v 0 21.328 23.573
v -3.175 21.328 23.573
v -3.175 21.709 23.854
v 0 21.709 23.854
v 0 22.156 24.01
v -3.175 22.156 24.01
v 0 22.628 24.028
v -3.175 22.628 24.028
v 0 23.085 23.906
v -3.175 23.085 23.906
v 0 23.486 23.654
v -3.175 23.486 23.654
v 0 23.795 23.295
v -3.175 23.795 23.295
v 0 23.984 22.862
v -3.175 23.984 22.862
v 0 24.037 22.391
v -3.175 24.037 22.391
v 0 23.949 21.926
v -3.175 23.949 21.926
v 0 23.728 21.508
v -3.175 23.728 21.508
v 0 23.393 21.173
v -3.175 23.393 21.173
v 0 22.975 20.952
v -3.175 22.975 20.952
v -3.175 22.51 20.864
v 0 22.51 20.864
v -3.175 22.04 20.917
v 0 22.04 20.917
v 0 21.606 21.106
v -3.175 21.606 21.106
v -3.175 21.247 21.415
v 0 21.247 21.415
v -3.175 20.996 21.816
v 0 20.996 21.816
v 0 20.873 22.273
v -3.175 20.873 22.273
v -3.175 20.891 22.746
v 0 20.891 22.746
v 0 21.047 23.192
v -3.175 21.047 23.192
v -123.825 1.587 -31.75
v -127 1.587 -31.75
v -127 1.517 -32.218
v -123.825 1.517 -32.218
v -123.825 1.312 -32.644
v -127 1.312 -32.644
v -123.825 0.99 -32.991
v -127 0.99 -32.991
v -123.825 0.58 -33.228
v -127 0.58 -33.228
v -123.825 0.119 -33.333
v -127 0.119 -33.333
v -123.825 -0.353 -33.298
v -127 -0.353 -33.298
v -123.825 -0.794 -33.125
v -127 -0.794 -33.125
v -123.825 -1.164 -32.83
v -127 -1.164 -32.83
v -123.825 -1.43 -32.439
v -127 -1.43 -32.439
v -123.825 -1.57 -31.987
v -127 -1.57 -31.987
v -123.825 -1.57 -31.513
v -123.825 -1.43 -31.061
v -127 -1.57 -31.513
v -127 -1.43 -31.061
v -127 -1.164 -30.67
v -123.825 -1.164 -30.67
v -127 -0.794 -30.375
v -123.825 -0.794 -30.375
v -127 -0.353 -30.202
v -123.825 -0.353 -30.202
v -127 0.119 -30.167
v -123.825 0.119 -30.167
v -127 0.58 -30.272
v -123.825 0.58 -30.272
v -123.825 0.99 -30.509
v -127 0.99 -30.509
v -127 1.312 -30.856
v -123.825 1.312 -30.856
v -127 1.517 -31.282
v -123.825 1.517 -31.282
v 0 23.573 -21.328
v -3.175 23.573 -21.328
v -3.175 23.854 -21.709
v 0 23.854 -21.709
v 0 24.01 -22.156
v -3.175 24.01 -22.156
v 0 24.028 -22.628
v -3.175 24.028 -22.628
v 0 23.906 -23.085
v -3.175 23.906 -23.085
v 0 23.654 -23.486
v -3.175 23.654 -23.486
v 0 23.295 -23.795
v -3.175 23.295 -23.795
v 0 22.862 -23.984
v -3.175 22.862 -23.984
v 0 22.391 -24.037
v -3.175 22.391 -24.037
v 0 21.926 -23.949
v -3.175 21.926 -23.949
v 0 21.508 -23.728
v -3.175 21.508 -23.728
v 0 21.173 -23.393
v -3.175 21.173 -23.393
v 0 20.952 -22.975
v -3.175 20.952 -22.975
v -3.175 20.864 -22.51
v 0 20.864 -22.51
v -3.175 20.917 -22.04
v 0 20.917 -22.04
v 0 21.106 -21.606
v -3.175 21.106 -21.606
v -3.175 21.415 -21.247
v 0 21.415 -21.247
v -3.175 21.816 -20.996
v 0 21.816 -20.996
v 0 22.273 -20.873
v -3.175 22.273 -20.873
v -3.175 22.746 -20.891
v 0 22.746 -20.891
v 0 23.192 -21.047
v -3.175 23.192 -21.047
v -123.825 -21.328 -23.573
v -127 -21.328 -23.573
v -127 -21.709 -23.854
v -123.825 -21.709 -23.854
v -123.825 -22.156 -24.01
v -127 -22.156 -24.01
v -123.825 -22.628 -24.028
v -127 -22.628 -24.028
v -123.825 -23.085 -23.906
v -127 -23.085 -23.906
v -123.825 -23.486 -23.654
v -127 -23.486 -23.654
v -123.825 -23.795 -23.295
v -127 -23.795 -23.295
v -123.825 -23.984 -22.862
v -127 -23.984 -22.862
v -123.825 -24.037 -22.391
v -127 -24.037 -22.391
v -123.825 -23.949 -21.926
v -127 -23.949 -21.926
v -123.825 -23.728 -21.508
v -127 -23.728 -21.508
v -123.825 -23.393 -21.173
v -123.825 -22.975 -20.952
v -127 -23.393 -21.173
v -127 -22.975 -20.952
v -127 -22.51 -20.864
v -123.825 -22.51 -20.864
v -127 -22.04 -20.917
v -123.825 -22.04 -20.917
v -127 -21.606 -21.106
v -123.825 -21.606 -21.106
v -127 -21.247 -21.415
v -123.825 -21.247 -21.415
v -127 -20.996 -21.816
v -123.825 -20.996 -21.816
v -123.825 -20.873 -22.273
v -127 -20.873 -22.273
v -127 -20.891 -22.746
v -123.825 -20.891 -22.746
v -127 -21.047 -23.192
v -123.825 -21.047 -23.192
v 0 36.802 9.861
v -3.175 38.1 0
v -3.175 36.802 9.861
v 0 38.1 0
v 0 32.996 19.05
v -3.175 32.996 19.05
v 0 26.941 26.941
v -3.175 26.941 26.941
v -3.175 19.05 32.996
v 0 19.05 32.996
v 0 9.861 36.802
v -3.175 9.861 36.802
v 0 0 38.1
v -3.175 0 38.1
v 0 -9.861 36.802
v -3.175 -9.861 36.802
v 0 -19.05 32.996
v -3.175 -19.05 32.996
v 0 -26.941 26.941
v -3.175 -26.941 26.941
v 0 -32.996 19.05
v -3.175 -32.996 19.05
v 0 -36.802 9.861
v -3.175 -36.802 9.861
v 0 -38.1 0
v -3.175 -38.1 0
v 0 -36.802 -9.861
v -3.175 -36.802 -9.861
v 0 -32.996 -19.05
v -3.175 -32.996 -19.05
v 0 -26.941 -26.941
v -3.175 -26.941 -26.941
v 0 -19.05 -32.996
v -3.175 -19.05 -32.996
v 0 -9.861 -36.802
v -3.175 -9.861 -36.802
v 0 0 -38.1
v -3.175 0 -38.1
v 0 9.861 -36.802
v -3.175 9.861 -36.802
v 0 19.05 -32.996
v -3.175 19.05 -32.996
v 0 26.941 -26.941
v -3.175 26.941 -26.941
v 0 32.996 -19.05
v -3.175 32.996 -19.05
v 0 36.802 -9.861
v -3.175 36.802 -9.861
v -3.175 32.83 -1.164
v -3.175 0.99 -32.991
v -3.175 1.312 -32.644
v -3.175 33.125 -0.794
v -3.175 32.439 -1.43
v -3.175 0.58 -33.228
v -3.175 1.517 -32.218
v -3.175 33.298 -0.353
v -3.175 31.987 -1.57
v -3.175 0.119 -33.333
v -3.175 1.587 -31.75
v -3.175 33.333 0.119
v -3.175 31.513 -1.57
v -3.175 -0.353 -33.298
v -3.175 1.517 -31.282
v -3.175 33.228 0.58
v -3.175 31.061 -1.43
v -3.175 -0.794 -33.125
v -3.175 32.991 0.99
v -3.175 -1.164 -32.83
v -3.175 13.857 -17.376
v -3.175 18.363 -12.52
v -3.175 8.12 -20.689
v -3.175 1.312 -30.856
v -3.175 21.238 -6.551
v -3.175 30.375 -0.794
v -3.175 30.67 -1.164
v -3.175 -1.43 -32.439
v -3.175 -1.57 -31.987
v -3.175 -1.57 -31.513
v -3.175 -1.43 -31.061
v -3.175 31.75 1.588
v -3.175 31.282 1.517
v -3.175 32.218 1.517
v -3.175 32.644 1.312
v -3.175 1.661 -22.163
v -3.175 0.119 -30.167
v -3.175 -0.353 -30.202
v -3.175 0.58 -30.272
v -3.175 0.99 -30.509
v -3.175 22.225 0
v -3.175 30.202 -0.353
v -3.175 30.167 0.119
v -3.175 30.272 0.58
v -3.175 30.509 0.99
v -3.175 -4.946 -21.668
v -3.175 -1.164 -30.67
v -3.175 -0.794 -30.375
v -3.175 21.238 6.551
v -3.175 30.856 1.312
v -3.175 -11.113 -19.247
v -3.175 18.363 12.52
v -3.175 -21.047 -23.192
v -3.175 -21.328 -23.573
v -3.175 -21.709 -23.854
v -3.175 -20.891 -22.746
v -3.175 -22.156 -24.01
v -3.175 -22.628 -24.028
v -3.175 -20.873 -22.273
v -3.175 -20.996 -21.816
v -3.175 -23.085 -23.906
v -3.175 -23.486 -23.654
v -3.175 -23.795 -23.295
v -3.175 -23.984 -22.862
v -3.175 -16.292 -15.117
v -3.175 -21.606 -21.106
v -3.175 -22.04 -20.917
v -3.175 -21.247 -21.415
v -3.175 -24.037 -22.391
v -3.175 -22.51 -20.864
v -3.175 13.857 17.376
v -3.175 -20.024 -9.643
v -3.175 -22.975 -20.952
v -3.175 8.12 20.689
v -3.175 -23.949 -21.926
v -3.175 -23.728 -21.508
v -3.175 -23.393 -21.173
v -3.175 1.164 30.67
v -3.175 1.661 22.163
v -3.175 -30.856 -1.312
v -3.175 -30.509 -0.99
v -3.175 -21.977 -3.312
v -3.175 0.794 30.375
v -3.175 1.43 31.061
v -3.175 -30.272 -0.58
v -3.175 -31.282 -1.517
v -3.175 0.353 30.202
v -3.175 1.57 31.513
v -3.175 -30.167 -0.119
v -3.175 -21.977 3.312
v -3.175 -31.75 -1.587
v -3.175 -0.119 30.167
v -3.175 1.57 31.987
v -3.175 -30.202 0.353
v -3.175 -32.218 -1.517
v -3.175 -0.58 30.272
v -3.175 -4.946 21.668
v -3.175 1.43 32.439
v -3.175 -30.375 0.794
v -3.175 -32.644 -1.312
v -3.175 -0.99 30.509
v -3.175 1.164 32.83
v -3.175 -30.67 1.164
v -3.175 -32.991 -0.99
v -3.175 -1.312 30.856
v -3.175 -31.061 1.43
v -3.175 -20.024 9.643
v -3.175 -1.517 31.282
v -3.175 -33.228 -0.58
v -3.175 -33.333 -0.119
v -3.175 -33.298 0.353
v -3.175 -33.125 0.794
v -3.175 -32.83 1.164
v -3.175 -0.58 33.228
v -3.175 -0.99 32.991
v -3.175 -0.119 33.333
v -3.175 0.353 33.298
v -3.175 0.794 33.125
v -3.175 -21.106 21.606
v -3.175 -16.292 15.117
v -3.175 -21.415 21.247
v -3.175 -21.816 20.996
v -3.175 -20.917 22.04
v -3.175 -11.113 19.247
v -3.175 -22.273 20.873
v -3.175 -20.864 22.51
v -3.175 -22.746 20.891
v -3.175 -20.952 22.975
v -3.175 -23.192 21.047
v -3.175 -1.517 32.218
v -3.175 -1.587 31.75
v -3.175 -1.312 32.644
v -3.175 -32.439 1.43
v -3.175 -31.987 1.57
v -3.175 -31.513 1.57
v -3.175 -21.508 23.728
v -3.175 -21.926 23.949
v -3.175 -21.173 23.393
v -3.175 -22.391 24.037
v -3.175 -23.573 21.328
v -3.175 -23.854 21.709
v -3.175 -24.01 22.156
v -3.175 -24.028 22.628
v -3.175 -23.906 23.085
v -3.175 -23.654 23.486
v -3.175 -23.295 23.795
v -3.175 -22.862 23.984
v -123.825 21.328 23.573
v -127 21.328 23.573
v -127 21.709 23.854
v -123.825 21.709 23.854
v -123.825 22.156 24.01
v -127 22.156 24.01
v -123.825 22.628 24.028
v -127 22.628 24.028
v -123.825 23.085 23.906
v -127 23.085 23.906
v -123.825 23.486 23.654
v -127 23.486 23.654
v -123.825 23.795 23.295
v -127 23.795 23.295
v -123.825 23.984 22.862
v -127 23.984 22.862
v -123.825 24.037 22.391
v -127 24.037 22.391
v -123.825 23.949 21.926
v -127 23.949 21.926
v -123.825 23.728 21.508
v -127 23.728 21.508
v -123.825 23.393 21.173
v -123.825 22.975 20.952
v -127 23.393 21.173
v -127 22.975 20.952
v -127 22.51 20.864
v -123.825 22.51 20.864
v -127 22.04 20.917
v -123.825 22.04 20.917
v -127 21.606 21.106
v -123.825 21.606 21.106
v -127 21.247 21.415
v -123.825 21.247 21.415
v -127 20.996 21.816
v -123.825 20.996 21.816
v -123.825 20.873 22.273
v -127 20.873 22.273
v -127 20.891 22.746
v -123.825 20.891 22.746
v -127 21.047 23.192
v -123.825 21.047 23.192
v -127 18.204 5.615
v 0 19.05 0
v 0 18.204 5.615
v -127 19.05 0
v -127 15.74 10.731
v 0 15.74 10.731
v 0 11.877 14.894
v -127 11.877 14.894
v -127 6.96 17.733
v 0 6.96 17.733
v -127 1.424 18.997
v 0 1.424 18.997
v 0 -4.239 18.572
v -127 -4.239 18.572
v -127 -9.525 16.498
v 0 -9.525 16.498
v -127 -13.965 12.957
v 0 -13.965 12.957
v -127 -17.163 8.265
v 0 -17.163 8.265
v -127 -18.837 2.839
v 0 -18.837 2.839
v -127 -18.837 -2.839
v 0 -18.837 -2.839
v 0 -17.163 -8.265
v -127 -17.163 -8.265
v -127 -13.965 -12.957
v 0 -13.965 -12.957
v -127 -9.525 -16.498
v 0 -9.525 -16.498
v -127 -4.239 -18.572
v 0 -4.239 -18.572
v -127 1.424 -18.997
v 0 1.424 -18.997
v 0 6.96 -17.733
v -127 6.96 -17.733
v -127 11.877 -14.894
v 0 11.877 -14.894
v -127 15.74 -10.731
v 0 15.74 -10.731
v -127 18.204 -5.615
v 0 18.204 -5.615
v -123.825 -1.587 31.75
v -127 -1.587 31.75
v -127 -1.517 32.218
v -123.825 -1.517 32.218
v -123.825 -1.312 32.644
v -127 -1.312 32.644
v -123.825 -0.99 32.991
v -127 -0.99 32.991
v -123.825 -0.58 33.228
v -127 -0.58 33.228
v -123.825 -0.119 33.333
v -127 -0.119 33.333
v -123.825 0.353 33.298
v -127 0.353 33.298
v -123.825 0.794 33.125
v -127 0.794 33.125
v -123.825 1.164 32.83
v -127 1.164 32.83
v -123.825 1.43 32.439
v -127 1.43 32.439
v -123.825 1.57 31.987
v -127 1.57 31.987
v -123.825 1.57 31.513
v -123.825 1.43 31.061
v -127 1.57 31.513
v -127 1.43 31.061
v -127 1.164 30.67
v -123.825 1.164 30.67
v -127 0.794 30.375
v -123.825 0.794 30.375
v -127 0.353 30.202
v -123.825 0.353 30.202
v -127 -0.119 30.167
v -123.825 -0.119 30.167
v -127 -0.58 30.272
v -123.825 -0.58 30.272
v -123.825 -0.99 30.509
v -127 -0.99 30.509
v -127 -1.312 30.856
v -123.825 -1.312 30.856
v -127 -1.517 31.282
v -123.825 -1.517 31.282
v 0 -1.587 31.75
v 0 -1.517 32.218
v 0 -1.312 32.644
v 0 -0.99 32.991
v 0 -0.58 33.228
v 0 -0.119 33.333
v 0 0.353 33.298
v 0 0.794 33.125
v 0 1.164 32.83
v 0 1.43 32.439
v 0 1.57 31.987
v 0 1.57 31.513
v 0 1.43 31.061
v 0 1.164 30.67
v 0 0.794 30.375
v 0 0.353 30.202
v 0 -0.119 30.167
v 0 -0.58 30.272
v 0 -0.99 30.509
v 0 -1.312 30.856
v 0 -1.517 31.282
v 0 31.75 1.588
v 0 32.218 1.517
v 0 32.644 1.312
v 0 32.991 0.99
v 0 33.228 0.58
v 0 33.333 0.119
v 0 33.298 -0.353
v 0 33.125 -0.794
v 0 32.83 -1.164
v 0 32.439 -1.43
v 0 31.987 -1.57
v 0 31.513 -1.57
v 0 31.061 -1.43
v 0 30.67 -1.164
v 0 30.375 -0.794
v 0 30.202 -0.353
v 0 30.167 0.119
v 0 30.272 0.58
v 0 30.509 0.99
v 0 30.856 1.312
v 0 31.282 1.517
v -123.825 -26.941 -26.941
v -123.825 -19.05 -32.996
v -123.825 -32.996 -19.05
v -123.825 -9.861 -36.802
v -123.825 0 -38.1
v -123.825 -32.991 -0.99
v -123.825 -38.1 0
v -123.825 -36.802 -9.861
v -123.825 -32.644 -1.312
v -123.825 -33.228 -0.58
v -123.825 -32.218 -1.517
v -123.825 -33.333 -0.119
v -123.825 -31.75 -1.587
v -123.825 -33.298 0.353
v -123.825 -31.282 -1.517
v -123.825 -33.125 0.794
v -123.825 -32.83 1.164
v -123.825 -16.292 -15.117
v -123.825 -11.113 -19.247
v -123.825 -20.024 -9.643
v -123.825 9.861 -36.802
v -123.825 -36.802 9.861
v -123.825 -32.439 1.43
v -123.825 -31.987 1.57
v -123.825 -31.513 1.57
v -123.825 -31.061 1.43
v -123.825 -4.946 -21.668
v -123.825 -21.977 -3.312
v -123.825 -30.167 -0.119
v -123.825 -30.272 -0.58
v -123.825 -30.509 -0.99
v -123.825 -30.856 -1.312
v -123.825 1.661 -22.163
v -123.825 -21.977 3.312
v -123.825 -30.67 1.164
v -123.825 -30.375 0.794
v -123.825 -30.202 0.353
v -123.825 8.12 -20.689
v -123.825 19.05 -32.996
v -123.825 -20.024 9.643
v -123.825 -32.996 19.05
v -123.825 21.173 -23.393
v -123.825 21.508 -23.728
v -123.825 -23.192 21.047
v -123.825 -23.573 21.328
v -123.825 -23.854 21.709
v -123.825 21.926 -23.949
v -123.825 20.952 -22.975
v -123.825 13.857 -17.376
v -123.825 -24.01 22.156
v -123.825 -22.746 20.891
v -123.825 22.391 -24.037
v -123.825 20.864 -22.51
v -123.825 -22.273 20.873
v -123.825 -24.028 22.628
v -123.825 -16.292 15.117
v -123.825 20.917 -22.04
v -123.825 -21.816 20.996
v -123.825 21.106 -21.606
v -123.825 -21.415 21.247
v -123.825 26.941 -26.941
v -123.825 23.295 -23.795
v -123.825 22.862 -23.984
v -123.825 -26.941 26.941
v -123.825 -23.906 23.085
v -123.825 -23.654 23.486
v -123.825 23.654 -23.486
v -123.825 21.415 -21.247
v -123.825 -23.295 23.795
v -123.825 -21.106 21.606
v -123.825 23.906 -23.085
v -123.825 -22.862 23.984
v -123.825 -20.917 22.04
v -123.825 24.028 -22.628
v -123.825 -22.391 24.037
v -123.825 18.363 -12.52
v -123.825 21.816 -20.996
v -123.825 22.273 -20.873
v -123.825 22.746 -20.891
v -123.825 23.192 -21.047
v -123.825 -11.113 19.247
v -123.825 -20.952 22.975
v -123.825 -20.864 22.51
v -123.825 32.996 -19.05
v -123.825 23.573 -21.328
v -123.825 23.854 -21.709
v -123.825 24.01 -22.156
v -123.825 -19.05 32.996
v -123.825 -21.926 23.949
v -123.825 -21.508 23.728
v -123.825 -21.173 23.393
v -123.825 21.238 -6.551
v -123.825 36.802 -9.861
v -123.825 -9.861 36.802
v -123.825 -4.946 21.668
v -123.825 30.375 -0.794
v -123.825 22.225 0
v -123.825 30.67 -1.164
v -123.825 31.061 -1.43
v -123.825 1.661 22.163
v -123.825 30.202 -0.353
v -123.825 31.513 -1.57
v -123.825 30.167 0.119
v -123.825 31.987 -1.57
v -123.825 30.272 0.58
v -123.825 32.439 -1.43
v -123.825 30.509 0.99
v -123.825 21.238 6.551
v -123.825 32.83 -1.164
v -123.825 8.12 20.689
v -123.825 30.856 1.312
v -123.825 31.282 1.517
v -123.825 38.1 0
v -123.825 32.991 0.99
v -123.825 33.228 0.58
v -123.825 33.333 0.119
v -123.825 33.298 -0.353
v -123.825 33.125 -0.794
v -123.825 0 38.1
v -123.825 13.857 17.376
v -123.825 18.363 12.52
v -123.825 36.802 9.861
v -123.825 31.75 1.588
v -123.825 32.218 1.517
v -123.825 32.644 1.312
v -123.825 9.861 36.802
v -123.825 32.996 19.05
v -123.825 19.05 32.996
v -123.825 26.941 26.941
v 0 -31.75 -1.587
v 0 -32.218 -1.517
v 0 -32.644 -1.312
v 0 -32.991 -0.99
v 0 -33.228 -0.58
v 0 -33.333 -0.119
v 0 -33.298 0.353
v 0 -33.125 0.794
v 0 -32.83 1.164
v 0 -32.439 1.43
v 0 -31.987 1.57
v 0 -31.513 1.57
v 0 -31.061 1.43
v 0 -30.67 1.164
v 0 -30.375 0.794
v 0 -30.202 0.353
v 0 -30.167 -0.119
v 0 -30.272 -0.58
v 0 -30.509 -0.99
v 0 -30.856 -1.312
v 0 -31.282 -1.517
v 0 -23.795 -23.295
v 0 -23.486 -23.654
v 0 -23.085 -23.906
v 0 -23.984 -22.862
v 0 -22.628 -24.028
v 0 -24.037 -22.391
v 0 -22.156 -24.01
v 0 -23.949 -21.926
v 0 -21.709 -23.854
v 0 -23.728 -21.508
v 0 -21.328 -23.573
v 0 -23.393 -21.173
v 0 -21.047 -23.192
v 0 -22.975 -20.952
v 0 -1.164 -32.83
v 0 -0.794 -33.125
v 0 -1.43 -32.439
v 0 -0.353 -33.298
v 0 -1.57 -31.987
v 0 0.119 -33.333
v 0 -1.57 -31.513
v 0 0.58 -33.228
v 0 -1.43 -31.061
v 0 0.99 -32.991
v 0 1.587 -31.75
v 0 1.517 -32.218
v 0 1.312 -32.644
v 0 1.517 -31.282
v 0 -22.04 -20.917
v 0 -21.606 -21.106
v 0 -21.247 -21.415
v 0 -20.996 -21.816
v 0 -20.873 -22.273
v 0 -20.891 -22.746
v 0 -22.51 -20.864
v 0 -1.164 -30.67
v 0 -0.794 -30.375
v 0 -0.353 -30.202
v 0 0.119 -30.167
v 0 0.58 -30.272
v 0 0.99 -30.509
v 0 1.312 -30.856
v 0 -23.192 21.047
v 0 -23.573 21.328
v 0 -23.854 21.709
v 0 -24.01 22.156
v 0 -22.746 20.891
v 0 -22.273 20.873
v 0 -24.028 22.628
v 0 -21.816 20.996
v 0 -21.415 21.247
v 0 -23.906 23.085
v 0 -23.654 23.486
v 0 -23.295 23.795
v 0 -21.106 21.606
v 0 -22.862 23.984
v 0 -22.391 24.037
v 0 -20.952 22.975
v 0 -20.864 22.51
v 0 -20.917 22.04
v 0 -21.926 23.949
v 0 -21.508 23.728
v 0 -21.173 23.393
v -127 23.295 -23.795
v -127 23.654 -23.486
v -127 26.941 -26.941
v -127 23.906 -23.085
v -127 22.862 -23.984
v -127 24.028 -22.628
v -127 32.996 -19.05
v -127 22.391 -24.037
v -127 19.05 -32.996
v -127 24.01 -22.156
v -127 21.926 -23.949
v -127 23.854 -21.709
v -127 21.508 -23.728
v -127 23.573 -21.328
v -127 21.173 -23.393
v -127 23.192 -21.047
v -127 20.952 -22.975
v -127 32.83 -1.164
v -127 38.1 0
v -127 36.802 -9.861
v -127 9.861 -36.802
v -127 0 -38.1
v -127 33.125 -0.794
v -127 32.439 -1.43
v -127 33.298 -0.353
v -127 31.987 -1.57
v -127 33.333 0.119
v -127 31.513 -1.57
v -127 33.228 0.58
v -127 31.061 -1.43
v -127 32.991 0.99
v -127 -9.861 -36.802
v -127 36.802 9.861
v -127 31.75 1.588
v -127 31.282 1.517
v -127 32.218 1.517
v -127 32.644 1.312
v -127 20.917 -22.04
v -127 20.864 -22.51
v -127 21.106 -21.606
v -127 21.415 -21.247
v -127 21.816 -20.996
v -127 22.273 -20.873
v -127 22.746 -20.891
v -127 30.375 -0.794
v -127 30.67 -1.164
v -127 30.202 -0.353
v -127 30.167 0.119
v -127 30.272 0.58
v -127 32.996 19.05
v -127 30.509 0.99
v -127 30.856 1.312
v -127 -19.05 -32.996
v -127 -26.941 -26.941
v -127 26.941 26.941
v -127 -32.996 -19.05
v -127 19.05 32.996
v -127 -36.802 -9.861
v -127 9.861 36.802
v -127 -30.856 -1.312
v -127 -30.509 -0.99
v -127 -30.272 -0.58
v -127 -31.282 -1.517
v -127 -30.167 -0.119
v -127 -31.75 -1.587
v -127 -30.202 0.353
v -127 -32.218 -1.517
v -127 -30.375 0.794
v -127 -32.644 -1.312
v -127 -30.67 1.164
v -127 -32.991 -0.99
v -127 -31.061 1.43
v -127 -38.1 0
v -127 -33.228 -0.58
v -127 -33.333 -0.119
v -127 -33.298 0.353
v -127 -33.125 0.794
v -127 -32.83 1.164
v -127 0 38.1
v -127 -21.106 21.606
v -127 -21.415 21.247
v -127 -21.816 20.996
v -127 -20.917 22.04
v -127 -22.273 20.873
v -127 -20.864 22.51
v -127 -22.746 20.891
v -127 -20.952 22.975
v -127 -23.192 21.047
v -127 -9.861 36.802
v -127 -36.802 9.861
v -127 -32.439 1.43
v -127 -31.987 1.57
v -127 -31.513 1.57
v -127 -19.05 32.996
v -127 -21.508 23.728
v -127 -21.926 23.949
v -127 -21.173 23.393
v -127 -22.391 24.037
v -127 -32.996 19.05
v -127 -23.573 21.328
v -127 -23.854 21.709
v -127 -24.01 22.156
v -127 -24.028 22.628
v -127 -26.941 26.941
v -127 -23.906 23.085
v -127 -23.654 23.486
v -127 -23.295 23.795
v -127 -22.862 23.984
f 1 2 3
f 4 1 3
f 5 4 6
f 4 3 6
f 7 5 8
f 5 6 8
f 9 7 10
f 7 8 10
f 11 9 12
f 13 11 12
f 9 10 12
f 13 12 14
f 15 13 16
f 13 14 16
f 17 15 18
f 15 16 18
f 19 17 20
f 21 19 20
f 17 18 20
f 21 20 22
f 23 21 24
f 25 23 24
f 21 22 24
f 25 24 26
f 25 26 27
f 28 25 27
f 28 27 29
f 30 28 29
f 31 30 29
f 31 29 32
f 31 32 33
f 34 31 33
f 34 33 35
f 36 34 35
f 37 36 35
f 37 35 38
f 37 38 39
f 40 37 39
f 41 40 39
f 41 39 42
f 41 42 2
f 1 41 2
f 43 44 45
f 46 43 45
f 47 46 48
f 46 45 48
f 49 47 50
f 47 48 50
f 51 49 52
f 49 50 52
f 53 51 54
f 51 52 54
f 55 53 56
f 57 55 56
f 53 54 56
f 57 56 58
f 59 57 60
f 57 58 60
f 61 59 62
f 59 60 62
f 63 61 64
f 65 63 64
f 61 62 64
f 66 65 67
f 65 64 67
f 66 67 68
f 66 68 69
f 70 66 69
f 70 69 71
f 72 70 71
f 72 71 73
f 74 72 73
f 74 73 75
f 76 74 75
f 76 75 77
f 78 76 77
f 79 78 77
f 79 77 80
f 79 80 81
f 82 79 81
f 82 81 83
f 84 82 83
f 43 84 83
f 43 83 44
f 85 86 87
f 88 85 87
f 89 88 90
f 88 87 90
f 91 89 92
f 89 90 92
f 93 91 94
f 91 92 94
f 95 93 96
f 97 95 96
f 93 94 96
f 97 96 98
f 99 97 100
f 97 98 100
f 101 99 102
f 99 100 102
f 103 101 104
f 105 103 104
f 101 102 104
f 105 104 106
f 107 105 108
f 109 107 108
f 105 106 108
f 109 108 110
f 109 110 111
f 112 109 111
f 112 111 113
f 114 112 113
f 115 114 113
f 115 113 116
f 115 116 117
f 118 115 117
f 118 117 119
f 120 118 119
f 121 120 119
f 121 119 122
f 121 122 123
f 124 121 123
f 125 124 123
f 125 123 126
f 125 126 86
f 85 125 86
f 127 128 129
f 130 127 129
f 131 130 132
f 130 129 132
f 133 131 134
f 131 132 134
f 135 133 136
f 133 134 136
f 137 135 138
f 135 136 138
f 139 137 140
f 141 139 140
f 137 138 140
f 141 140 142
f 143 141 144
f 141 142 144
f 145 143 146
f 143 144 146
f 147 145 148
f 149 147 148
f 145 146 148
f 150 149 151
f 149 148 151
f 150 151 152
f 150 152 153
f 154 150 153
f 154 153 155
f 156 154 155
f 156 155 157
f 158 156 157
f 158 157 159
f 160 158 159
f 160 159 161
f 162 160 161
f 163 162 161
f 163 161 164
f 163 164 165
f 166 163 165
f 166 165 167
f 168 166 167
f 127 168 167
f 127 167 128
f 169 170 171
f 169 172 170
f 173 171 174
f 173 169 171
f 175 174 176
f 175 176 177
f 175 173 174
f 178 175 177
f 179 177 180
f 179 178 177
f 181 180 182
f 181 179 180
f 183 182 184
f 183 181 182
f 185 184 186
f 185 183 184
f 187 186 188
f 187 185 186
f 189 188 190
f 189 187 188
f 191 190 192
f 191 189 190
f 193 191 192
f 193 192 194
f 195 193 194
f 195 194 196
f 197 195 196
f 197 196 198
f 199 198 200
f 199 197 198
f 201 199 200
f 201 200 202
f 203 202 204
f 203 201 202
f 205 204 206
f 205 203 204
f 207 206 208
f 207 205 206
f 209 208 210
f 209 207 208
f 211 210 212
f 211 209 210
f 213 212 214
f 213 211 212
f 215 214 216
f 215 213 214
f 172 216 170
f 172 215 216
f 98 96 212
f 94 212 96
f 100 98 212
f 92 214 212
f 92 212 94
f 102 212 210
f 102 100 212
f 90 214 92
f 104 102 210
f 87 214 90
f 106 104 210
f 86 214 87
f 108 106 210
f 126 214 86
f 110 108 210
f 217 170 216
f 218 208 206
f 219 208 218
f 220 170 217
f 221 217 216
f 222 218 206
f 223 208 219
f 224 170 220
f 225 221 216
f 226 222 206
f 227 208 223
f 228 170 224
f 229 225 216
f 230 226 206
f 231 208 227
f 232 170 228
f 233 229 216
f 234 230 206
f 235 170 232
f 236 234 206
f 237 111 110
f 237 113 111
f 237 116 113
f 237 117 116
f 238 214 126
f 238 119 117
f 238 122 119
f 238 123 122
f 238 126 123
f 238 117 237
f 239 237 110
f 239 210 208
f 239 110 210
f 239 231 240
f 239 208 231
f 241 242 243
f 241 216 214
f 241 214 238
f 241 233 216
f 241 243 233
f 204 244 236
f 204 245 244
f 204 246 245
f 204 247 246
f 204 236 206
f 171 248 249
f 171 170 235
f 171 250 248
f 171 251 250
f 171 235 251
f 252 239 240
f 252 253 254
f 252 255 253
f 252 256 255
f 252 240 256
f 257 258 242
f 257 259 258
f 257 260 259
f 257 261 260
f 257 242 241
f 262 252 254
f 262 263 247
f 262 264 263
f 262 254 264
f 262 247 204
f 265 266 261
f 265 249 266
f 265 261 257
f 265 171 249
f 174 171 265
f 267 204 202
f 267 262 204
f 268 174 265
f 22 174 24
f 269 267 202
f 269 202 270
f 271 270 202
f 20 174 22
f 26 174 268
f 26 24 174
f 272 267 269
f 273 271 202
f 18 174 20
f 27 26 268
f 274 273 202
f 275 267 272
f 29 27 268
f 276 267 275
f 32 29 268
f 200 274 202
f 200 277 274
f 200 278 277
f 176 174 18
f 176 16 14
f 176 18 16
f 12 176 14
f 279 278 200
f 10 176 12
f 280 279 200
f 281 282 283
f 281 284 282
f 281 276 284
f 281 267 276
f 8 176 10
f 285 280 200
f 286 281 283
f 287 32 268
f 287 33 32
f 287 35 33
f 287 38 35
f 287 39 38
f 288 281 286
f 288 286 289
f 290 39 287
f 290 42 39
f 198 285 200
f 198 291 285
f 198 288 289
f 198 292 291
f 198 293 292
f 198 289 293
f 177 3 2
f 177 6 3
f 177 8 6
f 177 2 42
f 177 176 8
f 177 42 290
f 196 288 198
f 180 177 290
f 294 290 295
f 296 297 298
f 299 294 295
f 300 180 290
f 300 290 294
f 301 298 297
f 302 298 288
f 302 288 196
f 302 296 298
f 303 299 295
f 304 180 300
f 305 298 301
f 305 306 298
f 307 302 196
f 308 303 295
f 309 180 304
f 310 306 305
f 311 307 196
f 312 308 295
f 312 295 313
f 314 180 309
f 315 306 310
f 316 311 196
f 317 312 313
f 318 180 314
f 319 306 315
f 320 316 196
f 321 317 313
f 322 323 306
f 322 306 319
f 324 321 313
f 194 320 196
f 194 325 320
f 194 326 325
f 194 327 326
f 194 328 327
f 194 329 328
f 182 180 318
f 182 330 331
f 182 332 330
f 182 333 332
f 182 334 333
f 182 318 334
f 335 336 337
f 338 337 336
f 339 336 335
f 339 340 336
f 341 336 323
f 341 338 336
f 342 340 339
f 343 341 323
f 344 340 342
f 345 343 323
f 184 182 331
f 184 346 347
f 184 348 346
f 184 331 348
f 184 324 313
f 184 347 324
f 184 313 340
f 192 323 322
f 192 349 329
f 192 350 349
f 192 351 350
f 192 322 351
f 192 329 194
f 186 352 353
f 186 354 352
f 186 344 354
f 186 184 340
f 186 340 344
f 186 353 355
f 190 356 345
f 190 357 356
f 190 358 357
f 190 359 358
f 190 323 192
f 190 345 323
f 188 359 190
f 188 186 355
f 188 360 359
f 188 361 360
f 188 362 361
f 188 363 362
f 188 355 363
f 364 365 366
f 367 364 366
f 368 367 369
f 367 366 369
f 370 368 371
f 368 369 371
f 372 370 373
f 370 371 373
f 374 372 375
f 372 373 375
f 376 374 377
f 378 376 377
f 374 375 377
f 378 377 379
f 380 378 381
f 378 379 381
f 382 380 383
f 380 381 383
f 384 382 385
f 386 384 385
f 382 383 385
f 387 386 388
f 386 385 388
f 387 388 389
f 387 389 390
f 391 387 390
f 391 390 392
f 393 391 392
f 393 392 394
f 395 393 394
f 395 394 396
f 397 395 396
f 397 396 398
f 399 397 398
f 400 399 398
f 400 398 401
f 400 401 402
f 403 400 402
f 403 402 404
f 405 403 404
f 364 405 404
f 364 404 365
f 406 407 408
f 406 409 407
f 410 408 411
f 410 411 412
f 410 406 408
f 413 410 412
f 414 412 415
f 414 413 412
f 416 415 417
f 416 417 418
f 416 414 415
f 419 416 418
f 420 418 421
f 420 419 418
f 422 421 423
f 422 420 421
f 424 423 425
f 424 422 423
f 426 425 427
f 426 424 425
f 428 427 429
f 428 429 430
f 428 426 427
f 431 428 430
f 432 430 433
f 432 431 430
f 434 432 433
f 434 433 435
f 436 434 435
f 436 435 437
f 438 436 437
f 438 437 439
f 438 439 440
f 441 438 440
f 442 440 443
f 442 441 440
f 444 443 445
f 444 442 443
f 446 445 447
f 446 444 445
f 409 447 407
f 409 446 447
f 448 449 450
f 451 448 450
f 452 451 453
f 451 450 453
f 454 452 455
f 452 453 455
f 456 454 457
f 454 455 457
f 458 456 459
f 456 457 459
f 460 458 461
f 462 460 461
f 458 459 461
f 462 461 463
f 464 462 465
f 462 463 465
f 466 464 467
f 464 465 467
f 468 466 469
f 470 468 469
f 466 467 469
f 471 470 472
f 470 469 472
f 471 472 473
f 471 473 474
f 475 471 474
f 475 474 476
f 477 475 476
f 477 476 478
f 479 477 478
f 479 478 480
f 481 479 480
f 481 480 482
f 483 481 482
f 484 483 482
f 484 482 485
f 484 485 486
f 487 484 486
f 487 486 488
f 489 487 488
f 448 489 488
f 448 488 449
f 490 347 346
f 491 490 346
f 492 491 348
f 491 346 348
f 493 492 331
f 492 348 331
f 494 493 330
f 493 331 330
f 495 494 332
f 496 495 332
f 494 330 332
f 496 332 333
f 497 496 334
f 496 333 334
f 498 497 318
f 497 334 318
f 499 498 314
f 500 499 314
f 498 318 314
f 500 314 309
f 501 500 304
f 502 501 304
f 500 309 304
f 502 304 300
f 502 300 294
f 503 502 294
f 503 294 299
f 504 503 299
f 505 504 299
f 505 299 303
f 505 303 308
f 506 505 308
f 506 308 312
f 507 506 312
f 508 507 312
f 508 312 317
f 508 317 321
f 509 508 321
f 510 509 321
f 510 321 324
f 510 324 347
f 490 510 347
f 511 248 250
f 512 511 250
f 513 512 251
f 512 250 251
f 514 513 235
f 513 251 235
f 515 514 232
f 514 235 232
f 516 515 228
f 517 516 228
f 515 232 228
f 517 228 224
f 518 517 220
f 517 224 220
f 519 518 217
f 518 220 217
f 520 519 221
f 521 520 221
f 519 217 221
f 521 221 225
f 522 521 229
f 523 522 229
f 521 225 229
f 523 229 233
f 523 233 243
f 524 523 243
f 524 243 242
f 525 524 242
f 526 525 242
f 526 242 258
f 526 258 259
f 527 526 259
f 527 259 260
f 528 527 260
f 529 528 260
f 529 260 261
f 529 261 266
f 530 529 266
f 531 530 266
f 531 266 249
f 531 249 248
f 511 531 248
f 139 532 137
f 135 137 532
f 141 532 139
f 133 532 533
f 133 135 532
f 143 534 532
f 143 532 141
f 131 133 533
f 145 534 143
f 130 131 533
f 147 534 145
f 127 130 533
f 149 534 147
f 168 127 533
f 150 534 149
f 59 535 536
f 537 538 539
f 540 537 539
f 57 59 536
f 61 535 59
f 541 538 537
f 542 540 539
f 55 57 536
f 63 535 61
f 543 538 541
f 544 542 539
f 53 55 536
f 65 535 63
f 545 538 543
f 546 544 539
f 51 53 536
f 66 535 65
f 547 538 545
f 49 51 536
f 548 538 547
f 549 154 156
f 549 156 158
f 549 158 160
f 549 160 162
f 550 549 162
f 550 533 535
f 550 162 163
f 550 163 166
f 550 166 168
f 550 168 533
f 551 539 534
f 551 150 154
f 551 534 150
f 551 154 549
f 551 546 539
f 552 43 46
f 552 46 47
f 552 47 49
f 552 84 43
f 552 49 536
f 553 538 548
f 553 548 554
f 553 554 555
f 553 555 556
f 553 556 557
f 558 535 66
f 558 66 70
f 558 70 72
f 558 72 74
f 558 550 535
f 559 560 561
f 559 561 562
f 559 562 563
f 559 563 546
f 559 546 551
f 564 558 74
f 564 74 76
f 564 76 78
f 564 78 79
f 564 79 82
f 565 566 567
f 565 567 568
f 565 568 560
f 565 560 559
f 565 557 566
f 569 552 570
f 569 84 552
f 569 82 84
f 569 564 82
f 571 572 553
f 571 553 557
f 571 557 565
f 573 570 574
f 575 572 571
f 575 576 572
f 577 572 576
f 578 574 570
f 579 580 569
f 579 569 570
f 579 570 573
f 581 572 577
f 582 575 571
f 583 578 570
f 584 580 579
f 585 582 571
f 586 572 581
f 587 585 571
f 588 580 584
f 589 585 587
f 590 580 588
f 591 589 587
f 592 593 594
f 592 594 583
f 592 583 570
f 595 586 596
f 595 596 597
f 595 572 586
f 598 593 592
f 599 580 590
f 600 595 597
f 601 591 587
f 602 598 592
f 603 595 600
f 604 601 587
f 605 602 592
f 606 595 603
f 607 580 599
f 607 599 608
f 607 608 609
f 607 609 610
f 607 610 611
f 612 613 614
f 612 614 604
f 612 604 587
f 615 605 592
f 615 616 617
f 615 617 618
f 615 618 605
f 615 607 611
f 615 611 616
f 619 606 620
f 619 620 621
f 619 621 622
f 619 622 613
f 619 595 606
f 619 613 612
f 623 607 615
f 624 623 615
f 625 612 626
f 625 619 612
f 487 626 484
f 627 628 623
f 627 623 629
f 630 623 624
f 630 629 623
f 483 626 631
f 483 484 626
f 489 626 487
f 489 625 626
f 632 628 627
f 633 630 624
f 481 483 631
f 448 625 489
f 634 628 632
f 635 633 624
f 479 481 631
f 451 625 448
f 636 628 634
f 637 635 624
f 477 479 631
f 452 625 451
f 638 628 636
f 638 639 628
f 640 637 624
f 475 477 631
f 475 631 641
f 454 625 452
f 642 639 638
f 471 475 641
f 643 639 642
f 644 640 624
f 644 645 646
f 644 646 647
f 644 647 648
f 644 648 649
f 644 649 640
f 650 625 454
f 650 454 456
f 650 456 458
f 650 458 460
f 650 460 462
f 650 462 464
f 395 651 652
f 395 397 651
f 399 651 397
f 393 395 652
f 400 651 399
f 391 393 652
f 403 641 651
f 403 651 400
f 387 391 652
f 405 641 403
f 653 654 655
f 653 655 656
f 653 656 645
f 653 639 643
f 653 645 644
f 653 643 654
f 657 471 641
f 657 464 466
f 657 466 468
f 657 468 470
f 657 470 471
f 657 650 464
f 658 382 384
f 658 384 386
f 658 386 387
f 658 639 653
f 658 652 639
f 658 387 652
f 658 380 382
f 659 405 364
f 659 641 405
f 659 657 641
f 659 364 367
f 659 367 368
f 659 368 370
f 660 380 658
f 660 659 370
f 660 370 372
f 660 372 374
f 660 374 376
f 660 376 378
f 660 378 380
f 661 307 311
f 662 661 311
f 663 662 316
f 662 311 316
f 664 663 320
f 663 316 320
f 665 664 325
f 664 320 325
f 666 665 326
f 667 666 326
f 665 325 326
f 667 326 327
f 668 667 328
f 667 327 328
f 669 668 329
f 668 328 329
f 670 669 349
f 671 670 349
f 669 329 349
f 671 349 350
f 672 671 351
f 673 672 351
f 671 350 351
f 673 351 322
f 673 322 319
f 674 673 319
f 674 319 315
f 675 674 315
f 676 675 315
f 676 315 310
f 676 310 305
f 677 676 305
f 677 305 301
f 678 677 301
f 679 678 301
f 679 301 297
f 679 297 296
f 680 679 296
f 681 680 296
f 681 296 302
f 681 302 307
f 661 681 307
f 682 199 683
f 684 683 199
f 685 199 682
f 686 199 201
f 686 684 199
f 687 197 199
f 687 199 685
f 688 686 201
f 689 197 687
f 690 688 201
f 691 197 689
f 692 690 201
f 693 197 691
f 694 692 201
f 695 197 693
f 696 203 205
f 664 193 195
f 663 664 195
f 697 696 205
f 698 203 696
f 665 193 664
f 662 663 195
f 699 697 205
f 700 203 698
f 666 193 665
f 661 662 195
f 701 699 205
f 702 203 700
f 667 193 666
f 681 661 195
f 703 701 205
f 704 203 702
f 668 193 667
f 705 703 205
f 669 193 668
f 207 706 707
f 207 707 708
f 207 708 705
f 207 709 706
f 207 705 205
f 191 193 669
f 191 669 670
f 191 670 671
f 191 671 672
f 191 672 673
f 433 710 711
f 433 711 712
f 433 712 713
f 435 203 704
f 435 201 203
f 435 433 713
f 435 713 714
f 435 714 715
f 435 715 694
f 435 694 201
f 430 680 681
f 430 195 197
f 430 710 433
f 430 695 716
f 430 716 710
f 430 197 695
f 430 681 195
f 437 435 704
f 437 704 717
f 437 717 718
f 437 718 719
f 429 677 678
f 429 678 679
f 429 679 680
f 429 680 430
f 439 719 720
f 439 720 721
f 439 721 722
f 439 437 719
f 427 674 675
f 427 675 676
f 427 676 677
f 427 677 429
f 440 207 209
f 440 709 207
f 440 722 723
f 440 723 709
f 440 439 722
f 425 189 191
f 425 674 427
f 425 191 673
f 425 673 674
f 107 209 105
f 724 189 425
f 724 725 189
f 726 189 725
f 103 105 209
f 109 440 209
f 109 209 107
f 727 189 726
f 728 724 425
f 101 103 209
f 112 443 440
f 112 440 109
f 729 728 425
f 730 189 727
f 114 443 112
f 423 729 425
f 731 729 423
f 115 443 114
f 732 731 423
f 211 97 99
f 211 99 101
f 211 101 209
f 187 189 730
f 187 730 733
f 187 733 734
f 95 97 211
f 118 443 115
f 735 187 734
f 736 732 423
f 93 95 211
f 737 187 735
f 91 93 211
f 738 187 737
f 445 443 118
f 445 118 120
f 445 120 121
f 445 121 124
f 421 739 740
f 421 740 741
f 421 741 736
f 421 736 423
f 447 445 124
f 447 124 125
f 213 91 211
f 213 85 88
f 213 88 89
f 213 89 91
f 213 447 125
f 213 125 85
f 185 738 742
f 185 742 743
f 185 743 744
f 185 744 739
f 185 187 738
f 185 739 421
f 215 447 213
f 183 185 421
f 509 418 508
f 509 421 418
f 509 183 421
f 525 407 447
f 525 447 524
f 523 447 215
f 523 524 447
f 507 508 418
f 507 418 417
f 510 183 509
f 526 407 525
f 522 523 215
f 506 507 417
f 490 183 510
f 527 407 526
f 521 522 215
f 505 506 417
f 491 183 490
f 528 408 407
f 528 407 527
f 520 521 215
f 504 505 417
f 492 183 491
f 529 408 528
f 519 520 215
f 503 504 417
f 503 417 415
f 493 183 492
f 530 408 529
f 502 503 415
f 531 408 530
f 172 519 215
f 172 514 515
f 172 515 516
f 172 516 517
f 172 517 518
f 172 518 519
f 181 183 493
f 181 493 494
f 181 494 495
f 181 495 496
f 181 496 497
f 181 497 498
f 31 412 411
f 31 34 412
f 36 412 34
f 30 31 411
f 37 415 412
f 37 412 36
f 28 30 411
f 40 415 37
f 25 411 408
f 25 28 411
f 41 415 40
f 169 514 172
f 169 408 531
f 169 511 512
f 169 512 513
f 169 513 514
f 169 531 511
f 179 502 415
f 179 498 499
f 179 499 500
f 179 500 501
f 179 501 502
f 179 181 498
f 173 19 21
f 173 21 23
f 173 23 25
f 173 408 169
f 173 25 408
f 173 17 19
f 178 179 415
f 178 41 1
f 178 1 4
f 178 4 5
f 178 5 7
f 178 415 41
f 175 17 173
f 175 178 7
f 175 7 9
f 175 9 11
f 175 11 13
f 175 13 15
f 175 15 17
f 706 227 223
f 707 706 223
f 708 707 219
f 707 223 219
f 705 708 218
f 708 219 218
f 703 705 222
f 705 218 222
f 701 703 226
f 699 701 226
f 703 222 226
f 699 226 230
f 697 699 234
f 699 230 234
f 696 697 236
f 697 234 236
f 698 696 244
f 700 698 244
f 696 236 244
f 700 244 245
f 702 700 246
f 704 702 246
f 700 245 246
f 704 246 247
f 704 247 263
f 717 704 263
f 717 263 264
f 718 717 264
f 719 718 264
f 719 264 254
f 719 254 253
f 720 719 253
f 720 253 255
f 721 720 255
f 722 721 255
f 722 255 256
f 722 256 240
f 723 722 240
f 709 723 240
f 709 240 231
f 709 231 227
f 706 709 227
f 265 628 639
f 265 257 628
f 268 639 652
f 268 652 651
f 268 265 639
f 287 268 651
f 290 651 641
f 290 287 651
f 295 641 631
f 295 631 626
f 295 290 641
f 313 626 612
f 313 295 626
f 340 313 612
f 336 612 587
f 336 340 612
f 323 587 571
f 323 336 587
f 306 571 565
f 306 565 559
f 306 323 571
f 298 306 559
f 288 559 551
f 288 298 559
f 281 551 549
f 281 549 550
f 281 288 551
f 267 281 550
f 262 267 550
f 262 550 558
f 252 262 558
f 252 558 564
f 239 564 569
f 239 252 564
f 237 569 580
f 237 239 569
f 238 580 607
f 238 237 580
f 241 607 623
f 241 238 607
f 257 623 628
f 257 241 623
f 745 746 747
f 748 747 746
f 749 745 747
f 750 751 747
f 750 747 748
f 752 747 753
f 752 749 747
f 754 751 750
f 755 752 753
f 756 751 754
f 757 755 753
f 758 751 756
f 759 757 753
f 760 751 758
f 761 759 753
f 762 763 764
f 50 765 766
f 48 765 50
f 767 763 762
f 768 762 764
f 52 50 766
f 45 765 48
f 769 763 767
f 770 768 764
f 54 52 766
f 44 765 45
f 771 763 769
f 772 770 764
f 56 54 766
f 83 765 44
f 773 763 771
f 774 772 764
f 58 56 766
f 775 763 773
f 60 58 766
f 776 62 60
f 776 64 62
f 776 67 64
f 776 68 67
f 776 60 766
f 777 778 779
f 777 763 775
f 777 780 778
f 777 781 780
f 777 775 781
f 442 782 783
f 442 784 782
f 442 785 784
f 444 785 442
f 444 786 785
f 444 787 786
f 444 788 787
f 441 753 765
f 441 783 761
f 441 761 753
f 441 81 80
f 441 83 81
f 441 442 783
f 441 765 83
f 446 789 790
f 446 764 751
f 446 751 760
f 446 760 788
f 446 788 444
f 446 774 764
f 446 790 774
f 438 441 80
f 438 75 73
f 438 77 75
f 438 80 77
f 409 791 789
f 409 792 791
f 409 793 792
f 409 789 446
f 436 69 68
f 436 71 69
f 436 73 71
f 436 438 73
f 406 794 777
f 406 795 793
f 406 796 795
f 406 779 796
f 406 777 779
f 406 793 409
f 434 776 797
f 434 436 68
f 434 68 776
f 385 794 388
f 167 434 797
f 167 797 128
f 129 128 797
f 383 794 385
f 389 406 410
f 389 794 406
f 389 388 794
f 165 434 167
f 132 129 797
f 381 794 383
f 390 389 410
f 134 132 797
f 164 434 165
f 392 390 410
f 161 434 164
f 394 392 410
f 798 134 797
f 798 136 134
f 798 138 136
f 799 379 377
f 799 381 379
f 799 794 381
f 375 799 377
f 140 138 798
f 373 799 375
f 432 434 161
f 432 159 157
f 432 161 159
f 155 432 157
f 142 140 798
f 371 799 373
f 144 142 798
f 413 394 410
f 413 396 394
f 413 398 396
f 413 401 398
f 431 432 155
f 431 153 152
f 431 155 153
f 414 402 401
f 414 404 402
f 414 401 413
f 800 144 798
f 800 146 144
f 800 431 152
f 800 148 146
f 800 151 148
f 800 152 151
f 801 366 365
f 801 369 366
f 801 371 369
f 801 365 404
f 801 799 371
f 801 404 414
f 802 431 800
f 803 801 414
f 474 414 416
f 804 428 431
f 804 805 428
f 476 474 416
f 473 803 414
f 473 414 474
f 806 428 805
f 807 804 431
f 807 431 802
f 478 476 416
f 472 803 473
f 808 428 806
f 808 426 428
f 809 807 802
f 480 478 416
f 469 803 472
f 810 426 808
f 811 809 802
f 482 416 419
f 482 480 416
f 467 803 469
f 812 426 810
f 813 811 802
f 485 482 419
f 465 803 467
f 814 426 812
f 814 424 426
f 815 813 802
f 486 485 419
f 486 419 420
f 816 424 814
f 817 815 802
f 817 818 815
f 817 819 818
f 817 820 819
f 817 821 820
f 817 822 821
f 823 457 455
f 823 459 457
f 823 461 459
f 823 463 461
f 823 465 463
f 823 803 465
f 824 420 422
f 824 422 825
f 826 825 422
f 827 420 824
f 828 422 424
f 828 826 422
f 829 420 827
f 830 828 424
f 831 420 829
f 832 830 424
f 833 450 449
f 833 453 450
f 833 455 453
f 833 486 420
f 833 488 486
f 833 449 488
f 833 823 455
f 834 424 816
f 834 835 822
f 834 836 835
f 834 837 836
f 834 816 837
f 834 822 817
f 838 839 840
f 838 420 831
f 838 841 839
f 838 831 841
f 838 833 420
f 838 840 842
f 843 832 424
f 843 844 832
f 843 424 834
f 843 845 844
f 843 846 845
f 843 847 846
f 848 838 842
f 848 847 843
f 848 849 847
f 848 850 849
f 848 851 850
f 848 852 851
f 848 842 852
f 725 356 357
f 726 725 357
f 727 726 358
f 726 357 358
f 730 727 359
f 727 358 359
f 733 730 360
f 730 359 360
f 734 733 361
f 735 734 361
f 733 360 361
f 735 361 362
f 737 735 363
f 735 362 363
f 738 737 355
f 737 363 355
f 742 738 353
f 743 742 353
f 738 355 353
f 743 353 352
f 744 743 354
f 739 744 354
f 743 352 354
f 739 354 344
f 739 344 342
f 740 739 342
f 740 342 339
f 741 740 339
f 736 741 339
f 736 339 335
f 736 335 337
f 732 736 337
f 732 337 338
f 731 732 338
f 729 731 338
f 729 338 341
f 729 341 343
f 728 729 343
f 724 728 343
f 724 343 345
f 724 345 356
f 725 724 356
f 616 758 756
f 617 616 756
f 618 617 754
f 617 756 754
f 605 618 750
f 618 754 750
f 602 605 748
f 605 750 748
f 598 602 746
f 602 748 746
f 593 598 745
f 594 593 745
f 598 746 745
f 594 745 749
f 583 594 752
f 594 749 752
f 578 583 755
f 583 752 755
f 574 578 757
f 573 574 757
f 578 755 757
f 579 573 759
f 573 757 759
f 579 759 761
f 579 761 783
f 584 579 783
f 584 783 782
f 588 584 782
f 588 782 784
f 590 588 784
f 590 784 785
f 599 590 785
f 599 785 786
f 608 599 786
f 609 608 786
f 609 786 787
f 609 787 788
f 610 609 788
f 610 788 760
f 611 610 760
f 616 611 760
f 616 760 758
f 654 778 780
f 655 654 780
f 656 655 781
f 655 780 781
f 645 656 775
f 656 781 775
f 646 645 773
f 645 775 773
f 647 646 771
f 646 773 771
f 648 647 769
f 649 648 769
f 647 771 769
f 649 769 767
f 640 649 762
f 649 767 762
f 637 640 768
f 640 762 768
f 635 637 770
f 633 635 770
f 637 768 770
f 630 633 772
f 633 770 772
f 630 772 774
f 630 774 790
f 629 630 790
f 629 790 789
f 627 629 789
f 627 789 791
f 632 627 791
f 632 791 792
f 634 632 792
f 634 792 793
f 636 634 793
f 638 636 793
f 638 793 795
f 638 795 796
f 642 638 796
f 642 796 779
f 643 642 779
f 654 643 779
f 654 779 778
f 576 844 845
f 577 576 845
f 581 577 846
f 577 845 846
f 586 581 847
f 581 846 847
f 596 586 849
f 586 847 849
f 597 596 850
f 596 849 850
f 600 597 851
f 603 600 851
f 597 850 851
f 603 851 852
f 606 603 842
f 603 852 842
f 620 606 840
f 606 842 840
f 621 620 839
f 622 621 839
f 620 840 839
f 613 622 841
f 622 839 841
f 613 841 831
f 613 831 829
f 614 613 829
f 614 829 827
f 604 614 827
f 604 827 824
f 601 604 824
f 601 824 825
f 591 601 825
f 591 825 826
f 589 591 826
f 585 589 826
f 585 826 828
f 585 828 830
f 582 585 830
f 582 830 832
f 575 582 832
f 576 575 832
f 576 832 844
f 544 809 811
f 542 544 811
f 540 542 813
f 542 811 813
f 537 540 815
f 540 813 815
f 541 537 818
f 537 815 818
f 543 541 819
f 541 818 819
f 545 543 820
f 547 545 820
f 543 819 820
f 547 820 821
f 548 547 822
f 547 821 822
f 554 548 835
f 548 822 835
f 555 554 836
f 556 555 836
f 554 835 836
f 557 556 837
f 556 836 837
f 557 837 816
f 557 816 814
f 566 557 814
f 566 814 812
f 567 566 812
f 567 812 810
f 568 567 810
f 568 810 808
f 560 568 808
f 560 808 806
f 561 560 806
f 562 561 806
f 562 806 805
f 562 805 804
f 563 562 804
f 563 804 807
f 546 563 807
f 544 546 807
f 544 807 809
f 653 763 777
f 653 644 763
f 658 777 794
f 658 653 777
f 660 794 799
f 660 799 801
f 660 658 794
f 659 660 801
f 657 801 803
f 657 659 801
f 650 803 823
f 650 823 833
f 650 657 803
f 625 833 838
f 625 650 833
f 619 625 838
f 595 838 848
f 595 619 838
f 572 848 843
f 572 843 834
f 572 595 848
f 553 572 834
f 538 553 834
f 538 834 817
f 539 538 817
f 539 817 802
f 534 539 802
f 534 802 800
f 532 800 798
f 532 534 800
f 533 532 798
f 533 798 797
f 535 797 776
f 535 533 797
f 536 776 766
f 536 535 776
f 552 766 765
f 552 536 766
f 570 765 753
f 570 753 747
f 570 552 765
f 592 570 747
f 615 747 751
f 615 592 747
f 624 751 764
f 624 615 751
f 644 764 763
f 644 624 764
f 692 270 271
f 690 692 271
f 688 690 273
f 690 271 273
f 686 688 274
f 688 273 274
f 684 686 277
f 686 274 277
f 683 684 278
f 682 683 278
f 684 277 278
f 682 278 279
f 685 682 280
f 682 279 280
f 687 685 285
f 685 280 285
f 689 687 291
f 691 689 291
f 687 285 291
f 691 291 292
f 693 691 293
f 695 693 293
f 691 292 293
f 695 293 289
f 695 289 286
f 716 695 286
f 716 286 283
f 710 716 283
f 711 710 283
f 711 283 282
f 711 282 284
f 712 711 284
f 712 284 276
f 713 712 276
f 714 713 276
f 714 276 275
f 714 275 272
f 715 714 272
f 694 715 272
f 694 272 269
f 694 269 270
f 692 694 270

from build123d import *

# Parameters (mm, degrees)
F_1_8_0_125_DIAMETER_HOLE1_D = 3.175
CIRPATTERN1_COUNT            = 8


with BuildPart() as part:
    # Sketch1 → Revolve1 (revolve)
    with BuildSketch(Plane.XY):
        Polygon((0, 38.1), (0, 19.05), (-127, 19.05), (-127, 38.1), (-123.825, 38.1), (-123.825, 22.225), (-3.175, 22.225), (-3.175, 38.1), align=None)
    revolve(axis=Axis((-152.49, 0, 0), (1, 0, 0)))

    # 1/8 (0.125) Diameter Hole1 (through all)
    with Locations(Plane(origin=(0, 0, 0), x_dir=(0, 0, -1), z_dir=(1, 0, 0))):
        with Locations((0, 31.75)):
            f_1_8_0_125_diameter_hole1 = Hole(F_1_8_0_125_DIAMETER_HOLE1_D / 2)

    # CirPattern1: 1/8 (0.125) Diameter Hole1 ×8 about axis
    cirpattern1_axis = Axis((0, 0, 0), (1, 0, 0))
    for i in range(1, CIRPATTERN1_COUNT):
        add(f_1_8_0_125_diameter_hole1.rotate(cirpattern1_axis, i * 360 / CIRPATTERN1_COUNT), mode=Mode.SUBTRACT)


solid = part.part
